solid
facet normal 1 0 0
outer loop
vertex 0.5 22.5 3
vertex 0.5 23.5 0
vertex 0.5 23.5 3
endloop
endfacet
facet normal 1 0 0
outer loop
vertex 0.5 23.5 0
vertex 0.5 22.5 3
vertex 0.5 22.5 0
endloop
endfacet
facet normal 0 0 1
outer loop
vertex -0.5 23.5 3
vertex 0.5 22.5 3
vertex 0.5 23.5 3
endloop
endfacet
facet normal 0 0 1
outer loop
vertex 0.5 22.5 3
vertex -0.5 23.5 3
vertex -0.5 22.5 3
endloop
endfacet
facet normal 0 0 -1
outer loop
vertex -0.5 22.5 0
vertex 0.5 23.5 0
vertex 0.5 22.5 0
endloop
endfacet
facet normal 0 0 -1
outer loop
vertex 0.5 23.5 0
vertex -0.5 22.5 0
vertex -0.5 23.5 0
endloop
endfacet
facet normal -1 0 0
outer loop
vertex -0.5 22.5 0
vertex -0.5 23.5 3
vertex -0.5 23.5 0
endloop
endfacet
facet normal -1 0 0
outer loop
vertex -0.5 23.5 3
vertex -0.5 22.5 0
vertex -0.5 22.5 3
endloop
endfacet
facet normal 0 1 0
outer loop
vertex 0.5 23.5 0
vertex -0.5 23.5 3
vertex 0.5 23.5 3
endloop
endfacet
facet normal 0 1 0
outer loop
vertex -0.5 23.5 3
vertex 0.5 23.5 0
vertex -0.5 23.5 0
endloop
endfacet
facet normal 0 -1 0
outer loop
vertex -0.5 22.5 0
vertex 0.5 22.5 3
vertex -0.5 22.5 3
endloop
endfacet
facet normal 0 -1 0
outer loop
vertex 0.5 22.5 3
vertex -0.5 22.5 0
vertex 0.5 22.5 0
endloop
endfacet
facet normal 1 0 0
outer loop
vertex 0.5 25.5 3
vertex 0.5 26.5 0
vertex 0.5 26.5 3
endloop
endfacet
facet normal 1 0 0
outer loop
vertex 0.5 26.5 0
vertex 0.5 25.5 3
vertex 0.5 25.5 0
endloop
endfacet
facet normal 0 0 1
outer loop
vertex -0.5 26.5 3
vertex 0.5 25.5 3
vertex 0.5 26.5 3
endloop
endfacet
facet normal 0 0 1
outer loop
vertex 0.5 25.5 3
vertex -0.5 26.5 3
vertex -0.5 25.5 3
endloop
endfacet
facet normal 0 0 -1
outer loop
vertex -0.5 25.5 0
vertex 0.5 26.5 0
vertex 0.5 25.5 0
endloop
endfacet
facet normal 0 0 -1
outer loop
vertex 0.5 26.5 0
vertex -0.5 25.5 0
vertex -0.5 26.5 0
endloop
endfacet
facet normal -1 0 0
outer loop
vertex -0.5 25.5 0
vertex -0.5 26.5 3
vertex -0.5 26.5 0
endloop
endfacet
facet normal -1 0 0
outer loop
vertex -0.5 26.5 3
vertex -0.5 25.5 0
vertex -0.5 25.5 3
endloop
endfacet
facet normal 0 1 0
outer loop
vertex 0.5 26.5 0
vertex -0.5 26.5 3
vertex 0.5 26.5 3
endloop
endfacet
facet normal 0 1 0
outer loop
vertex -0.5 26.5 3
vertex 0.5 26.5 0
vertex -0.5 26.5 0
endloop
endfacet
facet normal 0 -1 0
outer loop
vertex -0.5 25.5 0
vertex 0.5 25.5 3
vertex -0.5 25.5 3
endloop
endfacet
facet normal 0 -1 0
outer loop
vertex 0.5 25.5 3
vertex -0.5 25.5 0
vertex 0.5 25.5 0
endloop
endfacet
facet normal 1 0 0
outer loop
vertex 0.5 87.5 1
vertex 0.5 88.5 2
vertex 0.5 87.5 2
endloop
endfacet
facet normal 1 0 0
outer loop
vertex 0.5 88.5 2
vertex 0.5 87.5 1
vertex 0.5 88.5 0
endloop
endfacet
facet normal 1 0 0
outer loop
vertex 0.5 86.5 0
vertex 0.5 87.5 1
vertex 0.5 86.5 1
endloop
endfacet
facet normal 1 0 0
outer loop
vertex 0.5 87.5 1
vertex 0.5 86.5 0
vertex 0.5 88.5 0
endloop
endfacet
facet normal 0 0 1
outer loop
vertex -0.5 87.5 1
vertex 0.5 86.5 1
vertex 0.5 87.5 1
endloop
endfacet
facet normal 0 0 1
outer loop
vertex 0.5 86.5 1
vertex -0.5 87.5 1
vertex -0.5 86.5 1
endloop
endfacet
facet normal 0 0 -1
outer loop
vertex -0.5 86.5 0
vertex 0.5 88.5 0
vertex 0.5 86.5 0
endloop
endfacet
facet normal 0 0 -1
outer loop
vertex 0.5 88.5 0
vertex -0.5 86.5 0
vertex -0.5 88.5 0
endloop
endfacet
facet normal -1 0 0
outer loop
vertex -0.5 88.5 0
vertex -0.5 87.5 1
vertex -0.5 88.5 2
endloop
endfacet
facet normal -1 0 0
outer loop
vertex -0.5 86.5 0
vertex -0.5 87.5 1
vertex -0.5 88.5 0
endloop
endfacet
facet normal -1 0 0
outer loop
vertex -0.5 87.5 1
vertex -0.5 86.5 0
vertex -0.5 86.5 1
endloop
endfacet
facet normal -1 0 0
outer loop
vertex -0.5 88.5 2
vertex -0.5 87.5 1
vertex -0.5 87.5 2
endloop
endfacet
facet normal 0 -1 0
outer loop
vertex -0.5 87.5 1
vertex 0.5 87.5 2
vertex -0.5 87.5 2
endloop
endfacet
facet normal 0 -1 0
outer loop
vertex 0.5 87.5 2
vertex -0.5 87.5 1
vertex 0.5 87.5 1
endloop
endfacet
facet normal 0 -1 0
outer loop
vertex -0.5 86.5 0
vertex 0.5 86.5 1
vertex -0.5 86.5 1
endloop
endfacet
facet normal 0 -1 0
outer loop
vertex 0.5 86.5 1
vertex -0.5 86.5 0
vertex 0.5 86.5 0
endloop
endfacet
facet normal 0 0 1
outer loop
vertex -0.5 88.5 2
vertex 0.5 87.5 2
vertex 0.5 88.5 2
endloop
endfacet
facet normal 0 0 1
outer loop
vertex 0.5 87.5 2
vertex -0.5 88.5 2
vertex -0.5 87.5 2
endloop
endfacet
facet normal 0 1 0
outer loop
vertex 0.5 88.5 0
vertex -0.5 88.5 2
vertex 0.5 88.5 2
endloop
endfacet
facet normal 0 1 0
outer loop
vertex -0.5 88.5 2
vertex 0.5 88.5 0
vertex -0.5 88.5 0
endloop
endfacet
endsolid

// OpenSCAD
union() {
    translate([0, 23, 1.5]) cube([1, 1, 3], center=true);
    translate([0, 26, 1.5]) cube([1, 1, 3], center=true);
    translate([0, 87, 0.5]) cube([1, 1, 1], center=true);
    translate([0, 88, 1.0]) cube([1, 1, 2], center=true);
}
